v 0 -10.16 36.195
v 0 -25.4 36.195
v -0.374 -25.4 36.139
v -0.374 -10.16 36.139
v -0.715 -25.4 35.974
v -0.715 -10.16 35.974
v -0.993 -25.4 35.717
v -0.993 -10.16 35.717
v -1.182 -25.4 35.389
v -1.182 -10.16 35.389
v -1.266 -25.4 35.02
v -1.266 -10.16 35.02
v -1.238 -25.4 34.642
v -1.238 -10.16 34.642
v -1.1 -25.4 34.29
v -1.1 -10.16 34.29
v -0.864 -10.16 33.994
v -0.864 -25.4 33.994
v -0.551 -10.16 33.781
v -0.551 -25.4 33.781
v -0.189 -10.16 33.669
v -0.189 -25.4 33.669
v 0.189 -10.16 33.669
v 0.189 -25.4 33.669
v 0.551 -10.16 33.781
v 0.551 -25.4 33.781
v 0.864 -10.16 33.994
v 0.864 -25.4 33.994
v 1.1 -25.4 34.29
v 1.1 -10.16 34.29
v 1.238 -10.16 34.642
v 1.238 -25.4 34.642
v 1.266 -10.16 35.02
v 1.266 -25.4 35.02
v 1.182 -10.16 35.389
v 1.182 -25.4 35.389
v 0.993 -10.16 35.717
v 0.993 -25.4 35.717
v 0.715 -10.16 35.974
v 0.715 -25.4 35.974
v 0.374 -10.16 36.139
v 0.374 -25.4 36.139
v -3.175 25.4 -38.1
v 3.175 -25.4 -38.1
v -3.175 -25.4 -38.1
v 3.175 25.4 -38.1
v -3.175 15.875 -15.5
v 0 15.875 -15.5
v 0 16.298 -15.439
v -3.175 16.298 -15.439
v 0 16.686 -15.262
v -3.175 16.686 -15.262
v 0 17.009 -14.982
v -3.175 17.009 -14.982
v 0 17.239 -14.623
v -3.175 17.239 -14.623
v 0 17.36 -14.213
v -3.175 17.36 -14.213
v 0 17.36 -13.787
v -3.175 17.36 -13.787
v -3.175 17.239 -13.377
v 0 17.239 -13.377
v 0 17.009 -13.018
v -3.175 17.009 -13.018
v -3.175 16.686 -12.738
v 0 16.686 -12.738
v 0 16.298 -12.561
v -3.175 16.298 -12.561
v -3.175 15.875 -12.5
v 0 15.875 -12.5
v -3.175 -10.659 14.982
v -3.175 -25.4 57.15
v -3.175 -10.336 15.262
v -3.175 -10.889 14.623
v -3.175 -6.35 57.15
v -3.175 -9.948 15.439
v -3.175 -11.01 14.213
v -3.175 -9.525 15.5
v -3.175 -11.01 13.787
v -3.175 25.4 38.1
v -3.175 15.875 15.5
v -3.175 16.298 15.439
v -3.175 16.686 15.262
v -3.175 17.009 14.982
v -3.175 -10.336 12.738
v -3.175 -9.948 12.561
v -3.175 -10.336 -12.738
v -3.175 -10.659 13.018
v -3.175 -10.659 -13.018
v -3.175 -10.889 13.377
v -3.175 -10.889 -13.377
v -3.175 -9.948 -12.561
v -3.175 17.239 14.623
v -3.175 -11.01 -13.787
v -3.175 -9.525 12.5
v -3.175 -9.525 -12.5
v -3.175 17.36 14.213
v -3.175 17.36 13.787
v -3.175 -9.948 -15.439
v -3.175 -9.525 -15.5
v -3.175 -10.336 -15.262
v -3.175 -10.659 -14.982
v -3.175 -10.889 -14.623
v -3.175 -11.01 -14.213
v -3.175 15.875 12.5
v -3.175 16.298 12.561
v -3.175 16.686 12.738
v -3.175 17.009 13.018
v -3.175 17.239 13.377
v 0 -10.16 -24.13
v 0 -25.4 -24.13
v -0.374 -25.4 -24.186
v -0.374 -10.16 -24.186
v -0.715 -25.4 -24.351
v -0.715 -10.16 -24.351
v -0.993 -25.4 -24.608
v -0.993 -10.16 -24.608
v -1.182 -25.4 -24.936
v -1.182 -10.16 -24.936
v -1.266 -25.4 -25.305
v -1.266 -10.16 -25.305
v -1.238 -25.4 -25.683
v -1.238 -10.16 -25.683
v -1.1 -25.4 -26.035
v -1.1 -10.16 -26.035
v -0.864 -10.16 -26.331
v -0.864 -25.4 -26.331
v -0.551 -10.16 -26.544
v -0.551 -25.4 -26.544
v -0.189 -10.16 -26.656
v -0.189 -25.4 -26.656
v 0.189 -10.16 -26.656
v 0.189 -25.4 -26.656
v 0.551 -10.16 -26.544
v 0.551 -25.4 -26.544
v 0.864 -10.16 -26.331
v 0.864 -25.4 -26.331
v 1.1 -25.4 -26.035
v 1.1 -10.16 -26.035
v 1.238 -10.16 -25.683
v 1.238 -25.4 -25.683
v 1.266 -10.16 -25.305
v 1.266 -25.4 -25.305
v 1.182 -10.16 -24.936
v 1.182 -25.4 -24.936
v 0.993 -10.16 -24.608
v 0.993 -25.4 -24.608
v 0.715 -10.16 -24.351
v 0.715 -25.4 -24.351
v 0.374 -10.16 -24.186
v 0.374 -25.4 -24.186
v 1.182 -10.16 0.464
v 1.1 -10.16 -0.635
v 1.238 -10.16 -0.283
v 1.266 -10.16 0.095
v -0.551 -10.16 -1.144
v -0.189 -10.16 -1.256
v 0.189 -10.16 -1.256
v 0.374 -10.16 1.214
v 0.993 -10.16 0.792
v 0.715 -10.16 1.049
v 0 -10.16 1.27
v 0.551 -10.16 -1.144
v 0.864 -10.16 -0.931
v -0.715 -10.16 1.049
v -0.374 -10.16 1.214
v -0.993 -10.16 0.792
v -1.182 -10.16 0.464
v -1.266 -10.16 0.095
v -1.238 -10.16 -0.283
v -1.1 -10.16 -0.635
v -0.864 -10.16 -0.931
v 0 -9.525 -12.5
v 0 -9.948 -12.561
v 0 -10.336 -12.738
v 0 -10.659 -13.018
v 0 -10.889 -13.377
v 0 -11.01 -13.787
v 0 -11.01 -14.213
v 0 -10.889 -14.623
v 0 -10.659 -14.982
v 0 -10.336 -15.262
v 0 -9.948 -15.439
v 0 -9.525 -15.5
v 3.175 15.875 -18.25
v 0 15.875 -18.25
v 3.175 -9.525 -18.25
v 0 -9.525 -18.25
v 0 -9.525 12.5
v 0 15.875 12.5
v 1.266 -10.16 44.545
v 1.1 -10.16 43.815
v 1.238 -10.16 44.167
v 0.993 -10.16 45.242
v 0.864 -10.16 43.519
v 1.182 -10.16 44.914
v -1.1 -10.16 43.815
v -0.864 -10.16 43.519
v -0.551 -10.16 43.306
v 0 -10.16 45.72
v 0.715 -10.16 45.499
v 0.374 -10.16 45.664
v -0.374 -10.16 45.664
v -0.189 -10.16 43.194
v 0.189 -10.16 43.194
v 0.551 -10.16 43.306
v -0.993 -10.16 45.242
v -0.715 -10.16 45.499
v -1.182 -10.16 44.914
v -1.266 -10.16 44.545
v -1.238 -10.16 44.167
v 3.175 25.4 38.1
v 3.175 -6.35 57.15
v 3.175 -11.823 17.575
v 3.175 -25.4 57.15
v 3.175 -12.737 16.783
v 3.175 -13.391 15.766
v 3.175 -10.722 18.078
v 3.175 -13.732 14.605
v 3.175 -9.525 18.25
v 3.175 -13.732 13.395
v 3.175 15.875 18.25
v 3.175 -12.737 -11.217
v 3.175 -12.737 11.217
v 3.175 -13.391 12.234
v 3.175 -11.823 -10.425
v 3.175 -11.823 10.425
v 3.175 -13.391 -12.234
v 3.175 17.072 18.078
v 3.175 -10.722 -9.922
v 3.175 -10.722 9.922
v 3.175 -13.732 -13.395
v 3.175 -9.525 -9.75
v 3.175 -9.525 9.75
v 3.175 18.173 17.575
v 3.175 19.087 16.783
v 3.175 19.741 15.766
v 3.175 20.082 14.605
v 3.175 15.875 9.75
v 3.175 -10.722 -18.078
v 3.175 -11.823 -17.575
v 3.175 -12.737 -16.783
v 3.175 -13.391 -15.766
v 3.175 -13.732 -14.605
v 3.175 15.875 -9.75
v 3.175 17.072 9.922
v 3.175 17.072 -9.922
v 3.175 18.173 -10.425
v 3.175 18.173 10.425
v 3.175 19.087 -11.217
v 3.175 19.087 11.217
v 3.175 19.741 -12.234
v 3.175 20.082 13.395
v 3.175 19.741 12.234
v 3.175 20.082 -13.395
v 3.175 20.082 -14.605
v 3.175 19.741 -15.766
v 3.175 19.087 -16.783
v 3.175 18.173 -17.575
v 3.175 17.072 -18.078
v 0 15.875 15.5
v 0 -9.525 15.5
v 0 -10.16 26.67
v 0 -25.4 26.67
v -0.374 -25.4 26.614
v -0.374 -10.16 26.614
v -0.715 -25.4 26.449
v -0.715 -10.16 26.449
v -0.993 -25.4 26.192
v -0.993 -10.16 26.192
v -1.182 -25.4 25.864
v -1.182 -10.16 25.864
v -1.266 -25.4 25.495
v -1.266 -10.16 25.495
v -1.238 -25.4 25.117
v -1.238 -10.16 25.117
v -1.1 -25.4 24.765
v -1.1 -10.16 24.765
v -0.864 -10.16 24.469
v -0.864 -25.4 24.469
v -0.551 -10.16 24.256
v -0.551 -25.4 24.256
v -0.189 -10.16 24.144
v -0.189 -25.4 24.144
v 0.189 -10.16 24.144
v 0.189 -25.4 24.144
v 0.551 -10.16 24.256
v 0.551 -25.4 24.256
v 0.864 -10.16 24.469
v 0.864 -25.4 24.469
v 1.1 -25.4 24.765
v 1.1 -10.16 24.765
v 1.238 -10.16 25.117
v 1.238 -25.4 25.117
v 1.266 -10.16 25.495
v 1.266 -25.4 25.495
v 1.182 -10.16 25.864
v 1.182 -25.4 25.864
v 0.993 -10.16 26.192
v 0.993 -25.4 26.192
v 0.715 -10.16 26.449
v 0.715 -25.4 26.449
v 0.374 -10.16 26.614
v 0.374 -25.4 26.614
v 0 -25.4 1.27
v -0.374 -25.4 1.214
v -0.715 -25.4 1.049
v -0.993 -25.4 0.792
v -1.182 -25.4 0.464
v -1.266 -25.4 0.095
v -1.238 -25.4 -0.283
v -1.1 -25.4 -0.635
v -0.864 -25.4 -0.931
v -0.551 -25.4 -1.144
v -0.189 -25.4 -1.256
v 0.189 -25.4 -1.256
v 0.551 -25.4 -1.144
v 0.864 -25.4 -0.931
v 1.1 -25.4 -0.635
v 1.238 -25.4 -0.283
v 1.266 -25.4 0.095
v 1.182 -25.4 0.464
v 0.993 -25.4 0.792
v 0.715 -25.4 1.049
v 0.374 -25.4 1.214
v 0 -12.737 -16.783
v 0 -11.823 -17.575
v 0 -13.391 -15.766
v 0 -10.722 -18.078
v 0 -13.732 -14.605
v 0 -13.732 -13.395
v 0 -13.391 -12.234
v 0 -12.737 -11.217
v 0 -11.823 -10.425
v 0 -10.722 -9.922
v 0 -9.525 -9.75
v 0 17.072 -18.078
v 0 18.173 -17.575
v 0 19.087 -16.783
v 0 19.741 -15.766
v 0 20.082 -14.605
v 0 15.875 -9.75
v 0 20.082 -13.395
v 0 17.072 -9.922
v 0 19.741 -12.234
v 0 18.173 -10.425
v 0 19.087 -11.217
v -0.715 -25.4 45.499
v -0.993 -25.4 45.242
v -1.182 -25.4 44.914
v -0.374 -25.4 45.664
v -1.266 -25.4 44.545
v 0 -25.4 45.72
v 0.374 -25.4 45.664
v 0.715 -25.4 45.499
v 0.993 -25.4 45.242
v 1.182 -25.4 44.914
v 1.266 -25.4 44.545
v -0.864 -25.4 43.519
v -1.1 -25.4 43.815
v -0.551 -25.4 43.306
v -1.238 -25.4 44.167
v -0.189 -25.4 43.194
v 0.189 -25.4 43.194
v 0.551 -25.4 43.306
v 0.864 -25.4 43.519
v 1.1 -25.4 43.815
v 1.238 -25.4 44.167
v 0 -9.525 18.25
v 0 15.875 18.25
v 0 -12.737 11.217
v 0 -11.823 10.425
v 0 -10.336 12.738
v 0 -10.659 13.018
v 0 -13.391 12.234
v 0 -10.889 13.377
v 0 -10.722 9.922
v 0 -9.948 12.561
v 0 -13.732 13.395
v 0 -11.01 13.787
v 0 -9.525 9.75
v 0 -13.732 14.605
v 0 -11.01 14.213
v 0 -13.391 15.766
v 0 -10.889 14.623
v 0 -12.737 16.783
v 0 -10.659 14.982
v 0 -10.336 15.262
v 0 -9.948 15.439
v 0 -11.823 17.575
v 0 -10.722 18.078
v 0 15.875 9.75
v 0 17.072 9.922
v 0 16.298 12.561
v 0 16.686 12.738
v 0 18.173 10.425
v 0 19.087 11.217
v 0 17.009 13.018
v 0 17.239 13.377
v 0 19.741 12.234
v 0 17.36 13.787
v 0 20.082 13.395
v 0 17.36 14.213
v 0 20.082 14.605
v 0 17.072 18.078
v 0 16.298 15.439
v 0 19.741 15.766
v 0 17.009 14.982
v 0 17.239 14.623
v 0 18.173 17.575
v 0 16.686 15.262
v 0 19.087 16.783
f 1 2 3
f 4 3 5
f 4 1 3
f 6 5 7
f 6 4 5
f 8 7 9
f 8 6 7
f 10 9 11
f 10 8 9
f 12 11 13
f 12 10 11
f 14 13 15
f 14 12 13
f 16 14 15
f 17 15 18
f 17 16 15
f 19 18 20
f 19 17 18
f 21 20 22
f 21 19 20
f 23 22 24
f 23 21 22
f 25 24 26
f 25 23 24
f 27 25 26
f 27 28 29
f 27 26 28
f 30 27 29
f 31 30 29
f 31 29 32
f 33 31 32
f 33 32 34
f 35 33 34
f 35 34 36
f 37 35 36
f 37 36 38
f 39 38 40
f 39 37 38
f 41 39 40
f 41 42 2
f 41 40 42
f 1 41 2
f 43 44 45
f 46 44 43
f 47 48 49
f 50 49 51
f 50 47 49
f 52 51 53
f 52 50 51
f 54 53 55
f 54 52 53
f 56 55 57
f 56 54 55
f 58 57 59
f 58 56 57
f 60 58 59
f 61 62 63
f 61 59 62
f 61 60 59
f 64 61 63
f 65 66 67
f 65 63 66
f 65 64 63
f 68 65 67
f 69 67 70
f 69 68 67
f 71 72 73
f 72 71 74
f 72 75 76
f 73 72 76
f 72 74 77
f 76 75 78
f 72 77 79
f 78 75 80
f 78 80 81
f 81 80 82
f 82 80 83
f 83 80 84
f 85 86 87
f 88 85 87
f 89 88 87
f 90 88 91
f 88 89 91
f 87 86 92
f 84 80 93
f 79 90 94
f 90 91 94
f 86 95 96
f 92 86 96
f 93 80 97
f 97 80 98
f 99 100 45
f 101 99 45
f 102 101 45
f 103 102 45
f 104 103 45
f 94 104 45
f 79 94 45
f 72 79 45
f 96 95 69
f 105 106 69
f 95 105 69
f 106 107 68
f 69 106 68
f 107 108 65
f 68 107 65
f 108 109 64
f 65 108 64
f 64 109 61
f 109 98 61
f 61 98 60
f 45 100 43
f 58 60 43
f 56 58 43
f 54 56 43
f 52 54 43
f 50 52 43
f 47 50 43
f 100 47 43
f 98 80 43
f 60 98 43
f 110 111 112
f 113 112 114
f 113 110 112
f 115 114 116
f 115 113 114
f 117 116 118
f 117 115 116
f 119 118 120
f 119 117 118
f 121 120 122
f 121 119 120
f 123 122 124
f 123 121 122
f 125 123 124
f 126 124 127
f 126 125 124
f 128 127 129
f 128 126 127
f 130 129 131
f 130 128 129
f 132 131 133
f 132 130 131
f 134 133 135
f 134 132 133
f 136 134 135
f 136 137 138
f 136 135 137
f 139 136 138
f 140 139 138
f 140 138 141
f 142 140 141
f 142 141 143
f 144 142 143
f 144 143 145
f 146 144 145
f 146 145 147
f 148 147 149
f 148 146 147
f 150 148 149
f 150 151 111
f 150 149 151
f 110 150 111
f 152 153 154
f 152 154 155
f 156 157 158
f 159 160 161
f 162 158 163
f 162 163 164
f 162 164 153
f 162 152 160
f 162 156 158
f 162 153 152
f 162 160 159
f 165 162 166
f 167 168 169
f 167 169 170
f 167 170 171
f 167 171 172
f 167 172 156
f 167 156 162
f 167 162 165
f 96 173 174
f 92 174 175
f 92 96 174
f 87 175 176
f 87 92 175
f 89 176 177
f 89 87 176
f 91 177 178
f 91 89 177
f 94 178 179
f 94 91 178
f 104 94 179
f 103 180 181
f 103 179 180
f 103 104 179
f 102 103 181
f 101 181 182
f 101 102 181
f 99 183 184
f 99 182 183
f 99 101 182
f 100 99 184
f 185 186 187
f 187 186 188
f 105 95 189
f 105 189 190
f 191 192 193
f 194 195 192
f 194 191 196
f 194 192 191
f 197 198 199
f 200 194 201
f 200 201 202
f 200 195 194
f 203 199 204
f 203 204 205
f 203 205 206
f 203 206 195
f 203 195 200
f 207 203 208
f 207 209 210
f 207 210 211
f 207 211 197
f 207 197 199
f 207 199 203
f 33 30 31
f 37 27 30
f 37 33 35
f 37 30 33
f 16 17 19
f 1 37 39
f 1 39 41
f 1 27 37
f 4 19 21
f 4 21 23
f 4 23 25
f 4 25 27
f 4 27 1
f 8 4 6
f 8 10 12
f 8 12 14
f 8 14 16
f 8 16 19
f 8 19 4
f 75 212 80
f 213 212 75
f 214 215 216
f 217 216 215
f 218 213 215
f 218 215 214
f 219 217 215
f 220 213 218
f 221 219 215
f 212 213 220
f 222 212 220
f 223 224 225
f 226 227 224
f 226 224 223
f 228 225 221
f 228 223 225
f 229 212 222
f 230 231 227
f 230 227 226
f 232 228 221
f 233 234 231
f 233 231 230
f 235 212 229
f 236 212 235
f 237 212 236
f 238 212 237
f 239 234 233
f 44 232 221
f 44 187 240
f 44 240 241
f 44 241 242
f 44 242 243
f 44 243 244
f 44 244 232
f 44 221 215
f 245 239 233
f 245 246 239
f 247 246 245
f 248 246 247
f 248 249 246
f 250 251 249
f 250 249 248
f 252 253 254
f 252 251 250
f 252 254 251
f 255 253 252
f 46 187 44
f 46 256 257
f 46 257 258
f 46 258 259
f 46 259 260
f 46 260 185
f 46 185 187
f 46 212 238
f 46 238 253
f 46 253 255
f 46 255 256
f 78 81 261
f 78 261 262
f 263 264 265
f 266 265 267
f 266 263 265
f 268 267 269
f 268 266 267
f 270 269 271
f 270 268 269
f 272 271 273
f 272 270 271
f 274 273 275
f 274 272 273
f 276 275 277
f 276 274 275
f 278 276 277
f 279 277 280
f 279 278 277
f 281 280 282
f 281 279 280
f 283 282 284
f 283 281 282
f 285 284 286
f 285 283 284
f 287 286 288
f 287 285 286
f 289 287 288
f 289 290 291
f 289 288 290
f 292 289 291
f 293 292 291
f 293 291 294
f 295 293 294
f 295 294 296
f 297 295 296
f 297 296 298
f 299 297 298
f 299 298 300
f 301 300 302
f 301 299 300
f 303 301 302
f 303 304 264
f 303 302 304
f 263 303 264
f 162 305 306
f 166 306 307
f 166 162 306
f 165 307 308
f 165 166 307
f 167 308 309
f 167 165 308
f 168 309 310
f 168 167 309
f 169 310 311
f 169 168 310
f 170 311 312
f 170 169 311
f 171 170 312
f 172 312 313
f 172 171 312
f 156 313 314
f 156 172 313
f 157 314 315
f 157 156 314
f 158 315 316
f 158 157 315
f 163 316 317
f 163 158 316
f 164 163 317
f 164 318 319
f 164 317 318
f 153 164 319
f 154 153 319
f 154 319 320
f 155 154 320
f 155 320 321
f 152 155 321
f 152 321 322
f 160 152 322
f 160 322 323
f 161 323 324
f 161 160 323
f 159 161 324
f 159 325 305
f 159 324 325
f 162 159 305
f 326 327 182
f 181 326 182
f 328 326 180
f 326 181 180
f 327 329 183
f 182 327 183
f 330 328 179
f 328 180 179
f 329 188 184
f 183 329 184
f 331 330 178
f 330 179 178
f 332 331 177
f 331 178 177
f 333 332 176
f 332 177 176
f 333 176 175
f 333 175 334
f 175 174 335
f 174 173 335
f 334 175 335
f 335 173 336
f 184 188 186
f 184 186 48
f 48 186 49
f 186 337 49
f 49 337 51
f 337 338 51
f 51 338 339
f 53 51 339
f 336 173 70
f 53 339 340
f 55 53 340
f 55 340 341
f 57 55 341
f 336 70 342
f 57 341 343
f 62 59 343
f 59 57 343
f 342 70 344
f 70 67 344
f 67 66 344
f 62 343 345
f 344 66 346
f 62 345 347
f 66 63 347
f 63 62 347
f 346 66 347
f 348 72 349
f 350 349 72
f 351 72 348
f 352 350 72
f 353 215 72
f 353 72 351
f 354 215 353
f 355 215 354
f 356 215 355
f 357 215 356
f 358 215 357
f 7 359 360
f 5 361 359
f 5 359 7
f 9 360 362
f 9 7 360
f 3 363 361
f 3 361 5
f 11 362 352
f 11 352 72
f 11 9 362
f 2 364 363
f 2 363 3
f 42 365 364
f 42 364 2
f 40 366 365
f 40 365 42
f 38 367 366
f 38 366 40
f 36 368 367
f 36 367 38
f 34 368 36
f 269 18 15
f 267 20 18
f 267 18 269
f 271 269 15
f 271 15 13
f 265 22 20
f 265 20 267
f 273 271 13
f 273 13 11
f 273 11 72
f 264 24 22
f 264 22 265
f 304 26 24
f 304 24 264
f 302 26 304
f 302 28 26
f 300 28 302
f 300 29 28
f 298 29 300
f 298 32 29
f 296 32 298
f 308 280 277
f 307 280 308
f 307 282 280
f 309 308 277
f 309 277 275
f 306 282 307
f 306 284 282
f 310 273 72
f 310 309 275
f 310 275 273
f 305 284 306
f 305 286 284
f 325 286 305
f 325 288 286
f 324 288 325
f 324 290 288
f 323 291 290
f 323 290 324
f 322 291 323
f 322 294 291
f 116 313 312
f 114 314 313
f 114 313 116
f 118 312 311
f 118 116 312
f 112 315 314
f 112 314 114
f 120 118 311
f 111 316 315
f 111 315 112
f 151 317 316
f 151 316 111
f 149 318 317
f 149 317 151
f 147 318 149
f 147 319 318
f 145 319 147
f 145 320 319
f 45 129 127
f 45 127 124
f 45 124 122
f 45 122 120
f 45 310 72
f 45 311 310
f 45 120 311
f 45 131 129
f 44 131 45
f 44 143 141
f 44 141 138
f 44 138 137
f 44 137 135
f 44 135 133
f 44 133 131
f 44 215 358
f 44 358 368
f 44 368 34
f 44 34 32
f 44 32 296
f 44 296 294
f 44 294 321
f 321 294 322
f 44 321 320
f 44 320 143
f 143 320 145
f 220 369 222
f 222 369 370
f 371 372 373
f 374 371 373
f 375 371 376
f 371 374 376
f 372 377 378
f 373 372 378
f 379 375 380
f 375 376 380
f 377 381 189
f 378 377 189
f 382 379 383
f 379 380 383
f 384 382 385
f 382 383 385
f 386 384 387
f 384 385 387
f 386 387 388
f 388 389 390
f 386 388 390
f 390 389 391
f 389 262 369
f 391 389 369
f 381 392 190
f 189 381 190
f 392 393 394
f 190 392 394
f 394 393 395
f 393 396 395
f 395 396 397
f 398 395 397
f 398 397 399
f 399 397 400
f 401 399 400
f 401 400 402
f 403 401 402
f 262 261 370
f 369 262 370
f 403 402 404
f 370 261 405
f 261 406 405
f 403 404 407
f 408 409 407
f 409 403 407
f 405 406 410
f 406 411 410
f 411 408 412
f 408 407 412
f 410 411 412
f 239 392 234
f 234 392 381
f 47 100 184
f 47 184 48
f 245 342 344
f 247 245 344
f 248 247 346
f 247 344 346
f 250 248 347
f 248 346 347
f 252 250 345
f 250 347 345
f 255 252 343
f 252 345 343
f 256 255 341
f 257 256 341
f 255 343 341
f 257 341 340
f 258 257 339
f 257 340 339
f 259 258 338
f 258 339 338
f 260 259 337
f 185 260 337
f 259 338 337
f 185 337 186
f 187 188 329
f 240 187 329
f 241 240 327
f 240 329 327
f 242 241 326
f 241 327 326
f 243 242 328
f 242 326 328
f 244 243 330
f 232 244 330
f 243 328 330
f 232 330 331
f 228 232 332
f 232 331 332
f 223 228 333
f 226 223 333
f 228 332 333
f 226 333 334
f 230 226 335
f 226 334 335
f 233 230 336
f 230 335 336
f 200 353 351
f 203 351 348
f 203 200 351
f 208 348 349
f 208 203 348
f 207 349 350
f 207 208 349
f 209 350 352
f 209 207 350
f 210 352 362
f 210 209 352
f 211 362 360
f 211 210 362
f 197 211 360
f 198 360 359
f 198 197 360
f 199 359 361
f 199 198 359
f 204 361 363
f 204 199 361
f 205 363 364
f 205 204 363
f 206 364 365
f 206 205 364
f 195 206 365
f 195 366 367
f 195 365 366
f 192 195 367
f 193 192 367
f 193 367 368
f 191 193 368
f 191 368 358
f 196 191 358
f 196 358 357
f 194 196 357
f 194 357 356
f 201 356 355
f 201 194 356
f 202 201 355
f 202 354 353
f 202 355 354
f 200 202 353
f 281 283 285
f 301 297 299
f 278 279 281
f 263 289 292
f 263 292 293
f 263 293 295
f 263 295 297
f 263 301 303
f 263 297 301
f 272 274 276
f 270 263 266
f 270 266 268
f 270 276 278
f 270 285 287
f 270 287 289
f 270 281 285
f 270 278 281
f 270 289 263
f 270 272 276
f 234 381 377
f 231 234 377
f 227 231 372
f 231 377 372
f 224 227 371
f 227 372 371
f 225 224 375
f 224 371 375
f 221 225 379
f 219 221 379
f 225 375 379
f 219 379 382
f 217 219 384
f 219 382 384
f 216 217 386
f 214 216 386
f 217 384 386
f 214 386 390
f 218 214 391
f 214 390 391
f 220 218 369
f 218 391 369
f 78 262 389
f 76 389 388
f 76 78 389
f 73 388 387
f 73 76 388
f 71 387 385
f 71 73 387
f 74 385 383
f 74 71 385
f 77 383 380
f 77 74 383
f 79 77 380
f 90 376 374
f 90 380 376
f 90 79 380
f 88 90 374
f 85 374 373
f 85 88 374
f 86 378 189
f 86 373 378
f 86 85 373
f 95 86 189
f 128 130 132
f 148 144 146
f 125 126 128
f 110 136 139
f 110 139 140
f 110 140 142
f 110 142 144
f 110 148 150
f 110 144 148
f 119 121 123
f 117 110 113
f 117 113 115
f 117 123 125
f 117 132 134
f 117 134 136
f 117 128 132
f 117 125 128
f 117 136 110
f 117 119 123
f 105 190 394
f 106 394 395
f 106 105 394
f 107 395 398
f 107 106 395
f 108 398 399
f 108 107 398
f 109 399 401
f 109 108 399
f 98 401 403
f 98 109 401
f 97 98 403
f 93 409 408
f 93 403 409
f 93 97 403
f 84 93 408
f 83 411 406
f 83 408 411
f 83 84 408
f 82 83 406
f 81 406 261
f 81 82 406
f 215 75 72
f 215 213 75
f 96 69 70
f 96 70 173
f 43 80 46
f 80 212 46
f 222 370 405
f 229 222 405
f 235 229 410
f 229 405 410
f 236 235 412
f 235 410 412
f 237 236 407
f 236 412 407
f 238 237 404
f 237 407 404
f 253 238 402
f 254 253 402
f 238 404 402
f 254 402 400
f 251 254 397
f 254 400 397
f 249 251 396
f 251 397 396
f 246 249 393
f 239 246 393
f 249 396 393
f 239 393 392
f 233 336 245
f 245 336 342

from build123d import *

# Parameters (mm, degrees)
BOSS_EXTRUDE2_DEPTH     = 3.175
CUT_EXTRUDE1_DEPTH      = 63.861792847
CUT_EXTRUDE1_DEPTH_BACK = 63.861792847
CUT_EXTRUDE3_START      = -3.175
CUT_EXTRUDE3_DEPTH      = 3.175
CUT_EXTRUDE2_DEPTH      = 77.530014537
CUT_EXTRUDE2_DEPTH_BACK = 15.24
SKETCH4_R               = 1.27


with BuildPart() as part:
    # Sketch2 → Boss-Extrude2 (new, symmetric)
    with BuildSketch(Plane(origin=(0, 0, 0), x_dir=(0, 0, -1), z_dir=(1, 0, 0))):
        Polygon((-57.15, -25.4), (38.1, -25.4), (38.1, 25.4), (-38.1, 25.4), (-57.15, -6.35), align=None)
    extrude(amount=BOSS_EXTRUDE2_DEPTH, both=True)

    # Sketch3 → Cut-Extrude1 (cut, two sides: drawn at the far end of the back side and taken through both)
    with BuildSketch(Plane(origin=(3.175, 0, 0), x_dir=(0, 0, -1), z_dir=(1, 0, 0)).offset(-CUT_EXTRUDE1_DEPTH_BACK)):
        with BuildLine():
            Line((-15.500000048, 15.875), (-15.500000048, -9.525))
            ThreePointArc((-15.500000048, -9.525), (-14, -11.025000048), (-12.499999952, -9.525))
            Line((-12.499999952, -9.525), (-12.499999952, 15.875))
            ThreePointArc((-12.499999952, 15.875), (-14, 17.375000048), (-15.500000048, 15.875))
        make_face()
        with BuildLine():
            Line((12.499999952, 15.875), (12.499999952, -9.525))
            ThreePointArc((12.499999952, -9.525), (14, -11.025000048), (15.500000048, -9.525))
            Line((15.500000048, -9.525), (15.500000048, 15.875))
            ThreePointArc((15.500000048, 15.875), (14, 17.375000048), (12.499999952, 15.875))
        make_face()
    extrude(amount=CUT_EXTRUDE1_DEPTH + CUT_EXTRUDE1_DEPTH_BACK, mode=Mode.SUBTRACT)

    # Sketch3<3> → Cut-Extrude3 (cut)
    # profile 1 of 2: a face of its own
    with BuildSketch(Plane(origin=(3.175, 0, 0), x_dir=(0, 0, -1), z_dir=(1, 0, 0)).offset(CUT_EXTRUDE3_START)):
        with BuildLine():
            Line((-18.250000009, -9.525), (-18.250000009, 15.875))
            ThreePointArc((-18.250000009, 15.875), (-14, 20.125000009), (-9.749999991, 15.875))
            Line((-9.749999991, 15.875), (-9.749999991, -9.525))
            ThreePointArc((-9.749999991, -9.525), (-14, -13.775000009), (-18.250000009, -9.525))
        make_face()
        with BuildLine():
            Line((-15.500000048, -9.525), (-15.500000048, 15.875))
            ThreePointArc((-15.500000048, 15.875), (-14, 17.375000048), (-12.499999952, 15.875))
            Line((-12.499999952, 15.875), (-12.499999952, -9.525))
            ThreePointArc((-12.499999952, -9.525), (-14, -11.025000048), (-15.500000048, -9.525))
        make_face(mode=Mode.SUBTRACT)
    # profile 2 of 2: a face of its own
    with BuildSketch(Plane(origin=(3.175, 0, 0), x_dir=(0, 0, -1), z_dir=(1, 0, 0)).offset(CUT_EXTRUDE3_START)):
        with BuildLine():
            Line((9.749999991, -9.525), (9.749999991, 15.875))
            ThreePointArc((9.749999991, 15.875), (14, 20.125000009), (18.250000009, 15.875))
            Line((18.250000009, 15.875), (18.250000009, -9.525))
            ThreePointArc((18.250000009, -9.525), (14, -13.775000009), (9.749999991, -9.525))
        make_face()
        with BuildLine():
            Line((12.499999952, -9.525), (12.499999952, 15.875))
            ThreePointArc((12.499999952, 15.875), (14, 17.375000048), (15.500000048, 15.875))
            Line((15.500000048, 15.875), (15.500000048, -9.525))
            ThreePointArc((15.500000048, -9.525), (14, -11.025000048), (12.499999952, -9.525))
        make_face(mode=Mode.SUBTRACT)
    extrude(amount=CUT_EXTRUDE3_DEPTH, mode=Mode.SUBTRACT)

    # Sketch4 → Cut-Extrude2 (cut, two sides: drawn at the far end of the back side and taken through both)
    with BuildSketch(Plane.XZ.offset(25.4).offset(-CUT_EXTRUDE2_DEPTH_BACK)):
        with Locations((0, 25.4)):
            Circle(SKETCH4_R)
        Circle(SKETCH4_R)
        with Locations((0, -25.4)):
            Circle(SKETCH4_R)
        with Locations((0, 34.925)):
            Circle(SKETCH4_R)
        with Locations((0, 44.45)):
            Circle(SKETCH4_R)
    extrude(amount=CUT_EXTRUDE2_DEPTH + CUT_EXTRUDE2_DEPTH_BACK, mode=Mode.SUBTRACT)


solid = part.part
